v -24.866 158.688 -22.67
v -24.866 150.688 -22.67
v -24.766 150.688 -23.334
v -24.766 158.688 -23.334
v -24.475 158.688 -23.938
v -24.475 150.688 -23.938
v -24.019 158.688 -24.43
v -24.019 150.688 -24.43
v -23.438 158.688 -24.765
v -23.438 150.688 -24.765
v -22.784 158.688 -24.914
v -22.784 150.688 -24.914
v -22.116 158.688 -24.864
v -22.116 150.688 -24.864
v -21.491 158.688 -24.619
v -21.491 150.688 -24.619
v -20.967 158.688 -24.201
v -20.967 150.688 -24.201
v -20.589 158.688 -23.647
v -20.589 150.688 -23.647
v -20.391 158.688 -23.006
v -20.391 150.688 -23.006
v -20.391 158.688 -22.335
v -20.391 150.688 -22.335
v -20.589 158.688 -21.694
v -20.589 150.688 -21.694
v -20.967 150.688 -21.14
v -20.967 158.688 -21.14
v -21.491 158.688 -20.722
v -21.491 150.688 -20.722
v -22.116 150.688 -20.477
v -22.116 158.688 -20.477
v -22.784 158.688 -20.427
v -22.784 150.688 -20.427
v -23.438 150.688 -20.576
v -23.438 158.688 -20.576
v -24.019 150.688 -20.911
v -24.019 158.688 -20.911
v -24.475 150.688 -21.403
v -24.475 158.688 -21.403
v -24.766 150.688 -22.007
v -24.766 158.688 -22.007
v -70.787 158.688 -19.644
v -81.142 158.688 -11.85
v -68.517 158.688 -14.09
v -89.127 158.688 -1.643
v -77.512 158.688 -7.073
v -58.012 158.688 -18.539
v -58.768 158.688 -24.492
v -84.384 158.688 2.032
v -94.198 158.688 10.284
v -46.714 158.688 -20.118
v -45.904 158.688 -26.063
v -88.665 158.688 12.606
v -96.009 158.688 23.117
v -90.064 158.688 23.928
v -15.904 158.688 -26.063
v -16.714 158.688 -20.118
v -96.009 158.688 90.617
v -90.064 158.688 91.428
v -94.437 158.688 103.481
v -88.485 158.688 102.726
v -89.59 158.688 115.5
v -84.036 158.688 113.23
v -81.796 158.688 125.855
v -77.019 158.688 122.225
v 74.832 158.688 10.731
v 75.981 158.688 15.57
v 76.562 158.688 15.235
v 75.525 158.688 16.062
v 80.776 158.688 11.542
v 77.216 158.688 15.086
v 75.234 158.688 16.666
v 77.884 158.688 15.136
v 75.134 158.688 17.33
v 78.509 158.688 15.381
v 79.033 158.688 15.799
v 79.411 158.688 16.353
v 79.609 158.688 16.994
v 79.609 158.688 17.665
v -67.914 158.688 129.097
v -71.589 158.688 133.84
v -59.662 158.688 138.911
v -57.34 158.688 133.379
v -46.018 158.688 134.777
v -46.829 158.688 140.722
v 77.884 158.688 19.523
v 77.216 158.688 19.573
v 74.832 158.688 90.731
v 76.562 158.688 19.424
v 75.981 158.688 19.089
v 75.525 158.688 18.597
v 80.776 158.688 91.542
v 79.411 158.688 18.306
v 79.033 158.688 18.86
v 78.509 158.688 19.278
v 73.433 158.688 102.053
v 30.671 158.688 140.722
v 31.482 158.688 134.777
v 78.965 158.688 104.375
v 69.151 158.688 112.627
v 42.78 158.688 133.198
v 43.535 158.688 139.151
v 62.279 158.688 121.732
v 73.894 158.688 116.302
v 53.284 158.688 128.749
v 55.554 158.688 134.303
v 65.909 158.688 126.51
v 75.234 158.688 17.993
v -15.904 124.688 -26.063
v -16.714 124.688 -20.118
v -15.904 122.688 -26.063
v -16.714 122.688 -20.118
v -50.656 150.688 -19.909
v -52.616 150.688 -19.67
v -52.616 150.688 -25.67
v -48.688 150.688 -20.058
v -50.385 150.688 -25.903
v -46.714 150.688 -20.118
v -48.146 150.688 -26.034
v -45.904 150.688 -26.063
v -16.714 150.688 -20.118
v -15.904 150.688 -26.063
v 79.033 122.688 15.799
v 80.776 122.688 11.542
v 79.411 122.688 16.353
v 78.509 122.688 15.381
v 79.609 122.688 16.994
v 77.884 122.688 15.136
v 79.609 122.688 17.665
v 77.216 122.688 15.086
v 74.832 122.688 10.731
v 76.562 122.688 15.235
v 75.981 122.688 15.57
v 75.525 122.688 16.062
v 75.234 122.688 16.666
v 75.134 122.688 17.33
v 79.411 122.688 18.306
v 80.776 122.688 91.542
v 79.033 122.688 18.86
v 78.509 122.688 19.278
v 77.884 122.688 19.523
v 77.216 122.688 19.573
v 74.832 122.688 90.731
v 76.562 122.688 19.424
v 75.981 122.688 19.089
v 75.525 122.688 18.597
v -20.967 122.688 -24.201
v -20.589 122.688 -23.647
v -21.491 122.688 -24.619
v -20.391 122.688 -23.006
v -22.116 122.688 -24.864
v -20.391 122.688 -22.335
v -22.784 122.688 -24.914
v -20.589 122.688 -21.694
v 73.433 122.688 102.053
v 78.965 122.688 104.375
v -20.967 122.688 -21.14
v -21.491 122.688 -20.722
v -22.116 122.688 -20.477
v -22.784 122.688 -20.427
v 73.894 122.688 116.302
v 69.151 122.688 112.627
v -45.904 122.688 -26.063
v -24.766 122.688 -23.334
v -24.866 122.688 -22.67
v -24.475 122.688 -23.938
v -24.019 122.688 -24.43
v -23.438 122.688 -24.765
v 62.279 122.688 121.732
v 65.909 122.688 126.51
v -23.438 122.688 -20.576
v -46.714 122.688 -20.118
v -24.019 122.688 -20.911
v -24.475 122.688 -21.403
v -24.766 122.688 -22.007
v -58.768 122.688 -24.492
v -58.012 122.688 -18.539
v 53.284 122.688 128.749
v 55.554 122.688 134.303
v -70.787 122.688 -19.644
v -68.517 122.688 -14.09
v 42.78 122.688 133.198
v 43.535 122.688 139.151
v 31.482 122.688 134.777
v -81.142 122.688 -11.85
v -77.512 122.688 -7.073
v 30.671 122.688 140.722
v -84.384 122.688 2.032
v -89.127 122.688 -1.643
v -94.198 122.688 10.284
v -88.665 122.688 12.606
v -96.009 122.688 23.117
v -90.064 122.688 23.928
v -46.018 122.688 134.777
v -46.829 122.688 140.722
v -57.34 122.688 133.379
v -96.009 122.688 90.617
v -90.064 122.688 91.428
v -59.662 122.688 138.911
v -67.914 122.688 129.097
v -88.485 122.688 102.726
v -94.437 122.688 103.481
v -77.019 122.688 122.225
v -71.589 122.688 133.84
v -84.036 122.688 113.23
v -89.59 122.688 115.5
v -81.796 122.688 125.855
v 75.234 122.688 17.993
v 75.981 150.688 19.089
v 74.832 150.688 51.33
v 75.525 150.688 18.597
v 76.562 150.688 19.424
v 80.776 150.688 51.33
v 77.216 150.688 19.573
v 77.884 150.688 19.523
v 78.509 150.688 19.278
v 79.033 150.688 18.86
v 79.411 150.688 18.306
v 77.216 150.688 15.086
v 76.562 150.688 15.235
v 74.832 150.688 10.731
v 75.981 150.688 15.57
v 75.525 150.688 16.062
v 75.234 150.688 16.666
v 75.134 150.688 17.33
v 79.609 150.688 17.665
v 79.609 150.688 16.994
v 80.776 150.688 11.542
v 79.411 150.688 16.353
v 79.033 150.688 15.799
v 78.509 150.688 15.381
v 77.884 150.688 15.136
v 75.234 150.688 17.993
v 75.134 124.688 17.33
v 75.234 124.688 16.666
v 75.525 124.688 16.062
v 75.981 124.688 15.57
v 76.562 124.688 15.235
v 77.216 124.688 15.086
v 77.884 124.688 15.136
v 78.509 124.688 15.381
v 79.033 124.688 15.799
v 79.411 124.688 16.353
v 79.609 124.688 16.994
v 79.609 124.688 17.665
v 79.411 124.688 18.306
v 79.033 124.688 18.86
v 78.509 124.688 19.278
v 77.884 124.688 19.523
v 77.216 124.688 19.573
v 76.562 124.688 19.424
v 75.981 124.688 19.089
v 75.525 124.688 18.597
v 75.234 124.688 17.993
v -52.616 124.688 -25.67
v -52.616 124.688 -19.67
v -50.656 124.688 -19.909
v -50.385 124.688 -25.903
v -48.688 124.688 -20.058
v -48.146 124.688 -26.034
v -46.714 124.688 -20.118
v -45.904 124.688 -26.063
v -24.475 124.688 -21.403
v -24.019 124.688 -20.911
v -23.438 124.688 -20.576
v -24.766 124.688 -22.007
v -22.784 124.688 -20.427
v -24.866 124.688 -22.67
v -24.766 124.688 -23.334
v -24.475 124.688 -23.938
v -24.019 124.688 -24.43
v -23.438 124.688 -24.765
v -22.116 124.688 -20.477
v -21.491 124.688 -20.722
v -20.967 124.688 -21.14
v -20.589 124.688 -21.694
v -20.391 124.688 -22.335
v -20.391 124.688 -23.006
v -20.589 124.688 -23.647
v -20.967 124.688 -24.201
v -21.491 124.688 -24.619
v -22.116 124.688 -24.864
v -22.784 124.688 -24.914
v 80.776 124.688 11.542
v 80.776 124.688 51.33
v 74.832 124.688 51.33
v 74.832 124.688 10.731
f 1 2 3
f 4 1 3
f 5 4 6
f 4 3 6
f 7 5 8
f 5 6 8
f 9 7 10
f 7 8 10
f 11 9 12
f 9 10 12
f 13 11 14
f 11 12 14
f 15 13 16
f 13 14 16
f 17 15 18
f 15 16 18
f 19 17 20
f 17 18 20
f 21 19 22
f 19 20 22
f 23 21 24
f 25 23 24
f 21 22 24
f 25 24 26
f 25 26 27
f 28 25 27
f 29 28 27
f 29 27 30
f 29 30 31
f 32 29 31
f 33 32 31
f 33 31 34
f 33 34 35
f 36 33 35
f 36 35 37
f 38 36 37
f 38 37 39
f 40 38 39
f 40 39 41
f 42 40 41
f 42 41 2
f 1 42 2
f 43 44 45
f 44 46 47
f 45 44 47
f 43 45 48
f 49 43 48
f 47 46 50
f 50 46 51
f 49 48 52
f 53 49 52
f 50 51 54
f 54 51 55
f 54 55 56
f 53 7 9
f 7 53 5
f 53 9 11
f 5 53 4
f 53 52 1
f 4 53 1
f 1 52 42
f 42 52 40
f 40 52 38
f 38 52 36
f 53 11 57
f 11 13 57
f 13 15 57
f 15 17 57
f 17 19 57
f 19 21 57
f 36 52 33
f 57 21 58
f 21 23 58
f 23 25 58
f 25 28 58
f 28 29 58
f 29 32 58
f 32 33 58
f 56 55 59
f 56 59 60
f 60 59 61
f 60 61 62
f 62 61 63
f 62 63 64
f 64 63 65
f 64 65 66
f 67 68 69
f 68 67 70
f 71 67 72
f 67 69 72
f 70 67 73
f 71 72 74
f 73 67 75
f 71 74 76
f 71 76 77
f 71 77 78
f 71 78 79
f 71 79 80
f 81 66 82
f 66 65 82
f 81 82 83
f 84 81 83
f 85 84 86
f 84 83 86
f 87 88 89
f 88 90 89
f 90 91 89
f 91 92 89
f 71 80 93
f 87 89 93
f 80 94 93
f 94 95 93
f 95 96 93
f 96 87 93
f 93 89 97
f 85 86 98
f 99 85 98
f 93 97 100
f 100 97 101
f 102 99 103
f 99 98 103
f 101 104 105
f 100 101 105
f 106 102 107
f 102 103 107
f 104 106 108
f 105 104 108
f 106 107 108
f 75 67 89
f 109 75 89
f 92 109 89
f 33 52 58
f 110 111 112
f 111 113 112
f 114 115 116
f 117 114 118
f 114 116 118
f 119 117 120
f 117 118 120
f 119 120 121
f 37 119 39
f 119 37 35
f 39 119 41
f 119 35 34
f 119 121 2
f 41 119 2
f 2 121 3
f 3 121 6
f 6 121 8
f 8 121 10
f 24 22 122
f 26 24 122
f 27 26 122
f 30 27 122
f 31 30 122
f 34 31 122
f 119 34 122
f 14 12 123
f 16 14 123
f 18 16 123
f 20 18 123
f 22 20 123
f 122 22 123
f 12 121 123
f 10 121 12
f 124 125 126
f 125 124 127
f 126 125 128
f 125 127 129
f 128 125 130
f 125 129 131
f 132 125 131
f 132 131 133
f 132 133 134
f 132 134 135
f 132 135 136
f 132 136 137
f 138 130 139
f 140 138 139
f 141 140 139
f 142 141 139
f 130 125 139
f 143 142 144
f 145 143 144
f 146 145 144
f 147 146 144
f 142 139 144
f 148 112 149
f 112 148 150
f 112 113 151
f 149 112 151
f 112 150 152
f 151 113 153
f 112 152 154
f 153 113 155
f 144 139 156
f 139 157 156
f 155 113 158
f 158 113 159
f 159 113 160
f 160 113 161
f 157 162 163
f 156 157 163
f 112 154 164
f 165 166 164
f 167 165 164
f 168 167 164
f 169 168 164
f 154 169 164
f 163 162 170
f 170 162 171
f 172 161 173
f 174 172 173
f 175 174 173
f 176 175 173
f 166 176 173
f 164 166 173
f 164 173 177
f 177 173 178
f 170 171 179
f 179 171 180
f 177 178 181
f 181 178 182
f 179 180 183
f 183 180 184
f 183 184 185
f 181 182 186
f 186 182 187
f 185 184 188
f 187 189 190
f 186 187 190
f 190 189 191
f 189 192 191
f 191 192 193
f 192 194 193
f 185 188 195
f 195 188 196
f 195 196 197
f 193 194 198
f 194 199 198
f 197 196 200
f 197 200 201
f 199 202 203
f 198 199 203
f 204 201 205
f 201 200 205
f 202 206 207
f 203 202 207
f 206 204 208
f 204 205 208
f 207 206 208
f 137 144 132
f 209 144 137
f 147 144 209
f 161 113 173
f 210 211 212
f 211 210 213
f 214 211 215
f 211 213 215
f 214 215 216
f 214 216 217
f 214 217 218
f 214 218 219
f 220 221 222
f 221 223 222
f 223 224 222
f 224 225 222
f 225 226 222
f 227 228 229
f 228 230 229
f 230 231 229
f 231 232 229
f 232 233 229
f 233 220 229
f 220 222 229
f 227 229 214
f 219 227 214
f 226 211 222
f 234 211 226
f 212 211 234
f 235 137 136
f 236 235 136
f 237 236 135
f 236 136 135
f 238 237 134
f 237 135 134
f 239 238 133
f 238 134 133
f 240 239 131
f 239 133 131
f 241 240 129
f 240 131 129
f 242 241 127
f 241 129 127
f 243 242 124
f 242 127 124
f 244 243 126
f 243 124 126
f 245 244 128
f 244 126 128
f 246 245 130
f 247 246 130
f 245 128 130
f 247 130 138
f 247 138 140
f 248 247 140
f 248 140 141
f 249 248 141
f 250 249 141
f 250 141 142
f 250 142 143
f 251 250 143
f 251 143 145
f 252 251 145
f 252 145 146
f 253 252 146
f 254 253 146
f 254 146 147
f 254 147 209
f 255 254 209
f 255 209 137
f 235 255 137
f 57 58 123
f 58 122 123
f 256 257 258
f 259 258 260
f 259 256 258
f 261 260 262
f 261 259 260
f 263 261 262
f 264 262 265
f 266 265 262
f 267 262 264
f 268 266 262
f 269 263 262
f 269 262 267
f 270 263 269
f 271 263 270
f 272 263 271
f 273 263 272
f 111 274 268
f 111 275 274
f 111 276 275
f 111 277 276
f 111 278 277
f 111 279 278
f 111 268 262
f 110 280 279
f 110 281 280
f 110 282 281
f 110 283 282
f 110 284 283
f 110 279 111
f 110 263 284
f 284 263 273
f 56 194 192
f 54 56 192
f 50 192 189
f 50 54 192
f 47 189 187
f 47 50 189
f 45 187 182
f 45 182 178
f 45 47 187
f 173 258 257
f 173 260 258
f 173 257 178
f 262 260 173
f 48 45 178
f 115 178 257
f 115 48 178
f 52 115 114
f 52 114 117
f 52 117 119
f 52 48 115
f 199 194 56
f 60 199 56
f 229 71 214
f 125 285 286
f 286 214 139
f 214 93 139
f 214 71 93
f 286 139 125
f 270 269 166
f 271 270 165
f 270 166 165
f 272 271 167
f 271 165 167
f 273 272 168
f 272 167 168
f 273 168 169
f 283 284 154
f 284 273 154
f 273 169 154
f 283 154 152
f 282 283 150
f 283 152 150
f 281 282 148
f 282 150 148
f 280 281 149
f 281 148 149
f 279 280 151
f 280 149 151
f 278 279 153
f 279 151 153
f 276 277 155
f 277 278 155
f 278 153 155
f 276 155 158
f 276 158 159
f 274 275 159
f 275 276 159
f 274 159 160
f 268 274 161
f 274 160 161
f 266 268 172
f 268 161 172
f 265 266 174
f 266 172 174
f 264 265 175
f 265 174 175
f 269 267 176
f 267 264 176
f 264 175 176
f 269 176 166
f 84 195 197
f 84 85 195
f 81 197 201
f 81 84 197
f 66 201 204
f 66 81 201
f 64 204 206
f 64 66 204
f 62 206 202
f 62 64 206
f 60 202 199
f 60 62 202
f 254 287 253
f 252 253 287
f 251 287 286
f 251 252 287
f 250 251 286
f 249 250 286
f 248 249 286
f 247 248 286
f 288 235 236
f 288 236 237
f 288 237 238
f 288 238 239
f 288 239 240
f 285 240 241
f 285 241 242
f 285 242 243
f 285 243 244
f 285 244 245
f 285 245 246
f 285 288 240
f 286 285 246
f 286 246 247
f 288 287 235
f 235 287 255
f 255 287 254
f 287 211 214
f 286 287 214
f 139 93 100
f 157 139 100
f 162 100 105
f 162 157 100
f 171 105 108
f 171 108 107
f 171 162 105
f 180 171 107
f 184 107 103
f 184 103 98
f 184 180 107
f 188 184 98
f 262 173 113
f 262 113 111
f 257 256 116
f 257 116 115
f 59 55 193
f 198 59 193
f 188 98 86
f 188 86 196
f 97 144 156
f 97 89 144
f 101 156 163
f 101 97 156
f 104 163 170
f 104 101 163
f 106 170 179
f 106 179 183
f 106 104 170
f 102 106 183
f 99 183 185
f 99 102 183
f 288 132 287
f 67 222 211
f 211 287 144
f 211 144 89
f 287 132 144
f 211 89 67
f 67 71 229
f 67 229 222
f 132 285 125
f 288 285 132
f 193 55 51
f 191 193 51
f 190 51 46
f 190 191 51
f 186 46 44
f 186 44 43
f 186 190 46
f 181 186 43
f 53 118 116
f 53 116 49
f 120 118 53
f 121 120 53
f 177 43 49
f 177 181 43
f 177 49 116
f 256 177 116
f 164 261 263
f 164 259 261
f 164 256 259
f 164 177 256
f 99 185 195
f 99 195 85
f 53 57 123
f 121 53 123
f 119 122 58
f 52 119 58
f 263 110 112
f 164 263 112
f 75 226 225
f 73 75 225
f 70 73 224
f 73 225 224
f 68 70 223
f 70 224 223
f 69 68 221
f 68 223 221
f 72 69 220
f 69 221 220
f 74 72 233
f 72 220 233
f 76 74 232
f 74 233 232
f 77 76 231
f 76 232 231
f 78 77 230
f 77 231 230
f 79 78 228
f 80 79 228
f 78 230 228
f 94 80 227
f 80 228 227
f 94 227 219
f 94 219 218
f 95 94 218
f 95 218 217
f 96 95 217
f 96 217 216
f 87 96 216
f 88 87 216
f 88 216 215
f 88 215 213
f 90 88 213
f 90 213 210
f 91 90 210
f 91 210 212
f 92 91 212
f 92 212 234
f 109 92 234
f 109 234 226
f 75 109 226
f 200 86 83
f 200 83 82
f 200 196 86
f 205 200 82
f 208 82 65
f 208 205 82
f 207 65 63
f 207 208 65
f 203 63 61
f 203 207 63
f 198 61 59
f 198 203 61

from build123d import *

# Parameters (mm, degrees)
M4_CLEARANCE_HOLE1_D   = 4.5
CUT_EXTRUDE1_START     = -24
CUT_EXTRUDE1_OUTLINE_R = 2.25
CUT_EXTRUDE1_DEPTH     = 26
SKETCH8_R              = 2.25
CUT_EXTRUDE2_DEPTH     = 26


# Read off the part's stored shape, not the designer's step: Cut-Extrude1
with BuildPart() as part:
    # Sweep1: sweep along a path in Sketch1
    with BuildLine(Plane(origin=(0, 152.68757152, 0), x_dir=(1, 0, 0), z_dir=(0, 1, 0))) as sweep1_path:
        Line((77.38365074, -11.079514347), (77.38365074, -91.079514347))
        ThreePointArc((77.38365074, -91.079514347), (63.83733937, -123.783202977), (31.13365074, -137.329514347))
        Line((31.13365074, -137.329514347), (-46.36634926, -137.329514347))
        ThreePointArc((-46.36634926, -137.329514347), (-79.07003789, -123.783202977), (-92.61634926, -91.079514347))
        Line((-92.61634926, -91.079514347), (-92.61634926, -23.579514347))
        ThreePointArc((-92.61634926, -23.579514347), (-79.07003789, 9.124174283), (-46.36634926, 22.670485653))
        Line((-46.36634926, 22.670485653), (-16.36634926, 22.670485653))
    # Sketch2 → Sweep1 (sweep)
    with BuildSketch(Plane.ZY.offset(52.61634926)):
        Polygon((-25.670485653, 153.211679549), (-25.670485653, 158.68757152), (-19.670485653, 158.68757152), (-19.670485653, 148.68757152), (-19.670485653, 142.68757152), (-19.670485653, 122.68757152), (-25.670485653, 122.68757152), (-25.670485653, 142.68757152), align=None)
    sweep(path=sweep1_path.line)

    # M4 Clearance Hole1 (through all)
    with Locations(Plane(origin=(0, 158.68757152, 0), x_dir=(1, 0, 0), z_dir=(0, 1, 0))):
        with Locations((-22.61634926, 22.670485653), (77.38365074, -17.329514347)):
            Hole(M4_CLEARANCE_HOLE1_D / 2)

    # Cut-Extrude1 outline → Cut-Extrude1 (cut)
    # profile 1 of 2: a face of its own
    with BuildSketch(Plane(origin=(0, 148.68757152, 0), x_dir=(1, 0, 0), z_dir=(0, 1, 0)).offset(CUT_EXTRUDE1_START)):
        Polygon((74.831520752, -51.329514347), (80.776483816, -51.329514347), (80.776483816, -11.542249894), (74.831520752, -10.731439084), align=None)
        with Locations((77.38365074, -17.329514347)):
            Circle(CUT_EXTRUDE1_OUTLINE_R, mode=Mode.SUBTRACT)
    # profile 2 of 2: a face of its own
    with BuildSketch(Plane(origin=(0, 148.68757152, 0), x_dir=(1, 0, 0), z_dir=(0, 1, 0)).offset(CUT_EXTRUDE1_START)):
        with BuildLine():
            ThreePointArc((-45.903613713, 26.063318729), (-49.266640093, 25.980684534), (-52.61634926, 25.670485653))
            Line((-52.61634926, 25.670485653), (-52.61634926, 19.670485653))
            ThreePointArc((-52.61634926, 19.670485653), (-49.672978387, 19.99445958), (-46.714424523, 20.118355665))
            Line((-46.714424523, 20.118355665), (-16.714424523, 20.118355665))
            Line((-16.714424523, 20.118355665), (-15.903613713, 26.063318729))
            Line((-15.903613713, 26.063318729), (-45.903613713, 26.063318729))
        make_face()
        with Locations((-42.61634926, 22.670485653)):
            Circle(CUT_EXTRUDE1_OUTLINE_R, mode=Mode.SUBTRACT)
        with Locations((-22.61634926, 22.670485653)):
            Circle(CUT_EXTRUDE1_OUTLINE_R, mode=Mode.SUBTRACT)
    extrude(amount=CUT_EXTRUDE1_DEPTH, mode=Mode.SUBTRACT)

    # Sketch8 → Cut-Extrude2 (cut)
    with BuildSketch(Plane(origin=(0, 124.68757152, 0), x_dir=(1, 0, 0), z_dir=(0, 1, 0))):
        with Locations(Location((-22.61634926, 22.670485653, 0), (0, 0, 270))):
            Circle(SKETCH8_R)
        with Locations((-42.61634926, 22.670485653)):
            Circle(SKETCH8_R)
    extrude(amount=CUT_EXTRUDE2_DEPTH, mode=Mode.SUBTRACT)


solid = part.part
